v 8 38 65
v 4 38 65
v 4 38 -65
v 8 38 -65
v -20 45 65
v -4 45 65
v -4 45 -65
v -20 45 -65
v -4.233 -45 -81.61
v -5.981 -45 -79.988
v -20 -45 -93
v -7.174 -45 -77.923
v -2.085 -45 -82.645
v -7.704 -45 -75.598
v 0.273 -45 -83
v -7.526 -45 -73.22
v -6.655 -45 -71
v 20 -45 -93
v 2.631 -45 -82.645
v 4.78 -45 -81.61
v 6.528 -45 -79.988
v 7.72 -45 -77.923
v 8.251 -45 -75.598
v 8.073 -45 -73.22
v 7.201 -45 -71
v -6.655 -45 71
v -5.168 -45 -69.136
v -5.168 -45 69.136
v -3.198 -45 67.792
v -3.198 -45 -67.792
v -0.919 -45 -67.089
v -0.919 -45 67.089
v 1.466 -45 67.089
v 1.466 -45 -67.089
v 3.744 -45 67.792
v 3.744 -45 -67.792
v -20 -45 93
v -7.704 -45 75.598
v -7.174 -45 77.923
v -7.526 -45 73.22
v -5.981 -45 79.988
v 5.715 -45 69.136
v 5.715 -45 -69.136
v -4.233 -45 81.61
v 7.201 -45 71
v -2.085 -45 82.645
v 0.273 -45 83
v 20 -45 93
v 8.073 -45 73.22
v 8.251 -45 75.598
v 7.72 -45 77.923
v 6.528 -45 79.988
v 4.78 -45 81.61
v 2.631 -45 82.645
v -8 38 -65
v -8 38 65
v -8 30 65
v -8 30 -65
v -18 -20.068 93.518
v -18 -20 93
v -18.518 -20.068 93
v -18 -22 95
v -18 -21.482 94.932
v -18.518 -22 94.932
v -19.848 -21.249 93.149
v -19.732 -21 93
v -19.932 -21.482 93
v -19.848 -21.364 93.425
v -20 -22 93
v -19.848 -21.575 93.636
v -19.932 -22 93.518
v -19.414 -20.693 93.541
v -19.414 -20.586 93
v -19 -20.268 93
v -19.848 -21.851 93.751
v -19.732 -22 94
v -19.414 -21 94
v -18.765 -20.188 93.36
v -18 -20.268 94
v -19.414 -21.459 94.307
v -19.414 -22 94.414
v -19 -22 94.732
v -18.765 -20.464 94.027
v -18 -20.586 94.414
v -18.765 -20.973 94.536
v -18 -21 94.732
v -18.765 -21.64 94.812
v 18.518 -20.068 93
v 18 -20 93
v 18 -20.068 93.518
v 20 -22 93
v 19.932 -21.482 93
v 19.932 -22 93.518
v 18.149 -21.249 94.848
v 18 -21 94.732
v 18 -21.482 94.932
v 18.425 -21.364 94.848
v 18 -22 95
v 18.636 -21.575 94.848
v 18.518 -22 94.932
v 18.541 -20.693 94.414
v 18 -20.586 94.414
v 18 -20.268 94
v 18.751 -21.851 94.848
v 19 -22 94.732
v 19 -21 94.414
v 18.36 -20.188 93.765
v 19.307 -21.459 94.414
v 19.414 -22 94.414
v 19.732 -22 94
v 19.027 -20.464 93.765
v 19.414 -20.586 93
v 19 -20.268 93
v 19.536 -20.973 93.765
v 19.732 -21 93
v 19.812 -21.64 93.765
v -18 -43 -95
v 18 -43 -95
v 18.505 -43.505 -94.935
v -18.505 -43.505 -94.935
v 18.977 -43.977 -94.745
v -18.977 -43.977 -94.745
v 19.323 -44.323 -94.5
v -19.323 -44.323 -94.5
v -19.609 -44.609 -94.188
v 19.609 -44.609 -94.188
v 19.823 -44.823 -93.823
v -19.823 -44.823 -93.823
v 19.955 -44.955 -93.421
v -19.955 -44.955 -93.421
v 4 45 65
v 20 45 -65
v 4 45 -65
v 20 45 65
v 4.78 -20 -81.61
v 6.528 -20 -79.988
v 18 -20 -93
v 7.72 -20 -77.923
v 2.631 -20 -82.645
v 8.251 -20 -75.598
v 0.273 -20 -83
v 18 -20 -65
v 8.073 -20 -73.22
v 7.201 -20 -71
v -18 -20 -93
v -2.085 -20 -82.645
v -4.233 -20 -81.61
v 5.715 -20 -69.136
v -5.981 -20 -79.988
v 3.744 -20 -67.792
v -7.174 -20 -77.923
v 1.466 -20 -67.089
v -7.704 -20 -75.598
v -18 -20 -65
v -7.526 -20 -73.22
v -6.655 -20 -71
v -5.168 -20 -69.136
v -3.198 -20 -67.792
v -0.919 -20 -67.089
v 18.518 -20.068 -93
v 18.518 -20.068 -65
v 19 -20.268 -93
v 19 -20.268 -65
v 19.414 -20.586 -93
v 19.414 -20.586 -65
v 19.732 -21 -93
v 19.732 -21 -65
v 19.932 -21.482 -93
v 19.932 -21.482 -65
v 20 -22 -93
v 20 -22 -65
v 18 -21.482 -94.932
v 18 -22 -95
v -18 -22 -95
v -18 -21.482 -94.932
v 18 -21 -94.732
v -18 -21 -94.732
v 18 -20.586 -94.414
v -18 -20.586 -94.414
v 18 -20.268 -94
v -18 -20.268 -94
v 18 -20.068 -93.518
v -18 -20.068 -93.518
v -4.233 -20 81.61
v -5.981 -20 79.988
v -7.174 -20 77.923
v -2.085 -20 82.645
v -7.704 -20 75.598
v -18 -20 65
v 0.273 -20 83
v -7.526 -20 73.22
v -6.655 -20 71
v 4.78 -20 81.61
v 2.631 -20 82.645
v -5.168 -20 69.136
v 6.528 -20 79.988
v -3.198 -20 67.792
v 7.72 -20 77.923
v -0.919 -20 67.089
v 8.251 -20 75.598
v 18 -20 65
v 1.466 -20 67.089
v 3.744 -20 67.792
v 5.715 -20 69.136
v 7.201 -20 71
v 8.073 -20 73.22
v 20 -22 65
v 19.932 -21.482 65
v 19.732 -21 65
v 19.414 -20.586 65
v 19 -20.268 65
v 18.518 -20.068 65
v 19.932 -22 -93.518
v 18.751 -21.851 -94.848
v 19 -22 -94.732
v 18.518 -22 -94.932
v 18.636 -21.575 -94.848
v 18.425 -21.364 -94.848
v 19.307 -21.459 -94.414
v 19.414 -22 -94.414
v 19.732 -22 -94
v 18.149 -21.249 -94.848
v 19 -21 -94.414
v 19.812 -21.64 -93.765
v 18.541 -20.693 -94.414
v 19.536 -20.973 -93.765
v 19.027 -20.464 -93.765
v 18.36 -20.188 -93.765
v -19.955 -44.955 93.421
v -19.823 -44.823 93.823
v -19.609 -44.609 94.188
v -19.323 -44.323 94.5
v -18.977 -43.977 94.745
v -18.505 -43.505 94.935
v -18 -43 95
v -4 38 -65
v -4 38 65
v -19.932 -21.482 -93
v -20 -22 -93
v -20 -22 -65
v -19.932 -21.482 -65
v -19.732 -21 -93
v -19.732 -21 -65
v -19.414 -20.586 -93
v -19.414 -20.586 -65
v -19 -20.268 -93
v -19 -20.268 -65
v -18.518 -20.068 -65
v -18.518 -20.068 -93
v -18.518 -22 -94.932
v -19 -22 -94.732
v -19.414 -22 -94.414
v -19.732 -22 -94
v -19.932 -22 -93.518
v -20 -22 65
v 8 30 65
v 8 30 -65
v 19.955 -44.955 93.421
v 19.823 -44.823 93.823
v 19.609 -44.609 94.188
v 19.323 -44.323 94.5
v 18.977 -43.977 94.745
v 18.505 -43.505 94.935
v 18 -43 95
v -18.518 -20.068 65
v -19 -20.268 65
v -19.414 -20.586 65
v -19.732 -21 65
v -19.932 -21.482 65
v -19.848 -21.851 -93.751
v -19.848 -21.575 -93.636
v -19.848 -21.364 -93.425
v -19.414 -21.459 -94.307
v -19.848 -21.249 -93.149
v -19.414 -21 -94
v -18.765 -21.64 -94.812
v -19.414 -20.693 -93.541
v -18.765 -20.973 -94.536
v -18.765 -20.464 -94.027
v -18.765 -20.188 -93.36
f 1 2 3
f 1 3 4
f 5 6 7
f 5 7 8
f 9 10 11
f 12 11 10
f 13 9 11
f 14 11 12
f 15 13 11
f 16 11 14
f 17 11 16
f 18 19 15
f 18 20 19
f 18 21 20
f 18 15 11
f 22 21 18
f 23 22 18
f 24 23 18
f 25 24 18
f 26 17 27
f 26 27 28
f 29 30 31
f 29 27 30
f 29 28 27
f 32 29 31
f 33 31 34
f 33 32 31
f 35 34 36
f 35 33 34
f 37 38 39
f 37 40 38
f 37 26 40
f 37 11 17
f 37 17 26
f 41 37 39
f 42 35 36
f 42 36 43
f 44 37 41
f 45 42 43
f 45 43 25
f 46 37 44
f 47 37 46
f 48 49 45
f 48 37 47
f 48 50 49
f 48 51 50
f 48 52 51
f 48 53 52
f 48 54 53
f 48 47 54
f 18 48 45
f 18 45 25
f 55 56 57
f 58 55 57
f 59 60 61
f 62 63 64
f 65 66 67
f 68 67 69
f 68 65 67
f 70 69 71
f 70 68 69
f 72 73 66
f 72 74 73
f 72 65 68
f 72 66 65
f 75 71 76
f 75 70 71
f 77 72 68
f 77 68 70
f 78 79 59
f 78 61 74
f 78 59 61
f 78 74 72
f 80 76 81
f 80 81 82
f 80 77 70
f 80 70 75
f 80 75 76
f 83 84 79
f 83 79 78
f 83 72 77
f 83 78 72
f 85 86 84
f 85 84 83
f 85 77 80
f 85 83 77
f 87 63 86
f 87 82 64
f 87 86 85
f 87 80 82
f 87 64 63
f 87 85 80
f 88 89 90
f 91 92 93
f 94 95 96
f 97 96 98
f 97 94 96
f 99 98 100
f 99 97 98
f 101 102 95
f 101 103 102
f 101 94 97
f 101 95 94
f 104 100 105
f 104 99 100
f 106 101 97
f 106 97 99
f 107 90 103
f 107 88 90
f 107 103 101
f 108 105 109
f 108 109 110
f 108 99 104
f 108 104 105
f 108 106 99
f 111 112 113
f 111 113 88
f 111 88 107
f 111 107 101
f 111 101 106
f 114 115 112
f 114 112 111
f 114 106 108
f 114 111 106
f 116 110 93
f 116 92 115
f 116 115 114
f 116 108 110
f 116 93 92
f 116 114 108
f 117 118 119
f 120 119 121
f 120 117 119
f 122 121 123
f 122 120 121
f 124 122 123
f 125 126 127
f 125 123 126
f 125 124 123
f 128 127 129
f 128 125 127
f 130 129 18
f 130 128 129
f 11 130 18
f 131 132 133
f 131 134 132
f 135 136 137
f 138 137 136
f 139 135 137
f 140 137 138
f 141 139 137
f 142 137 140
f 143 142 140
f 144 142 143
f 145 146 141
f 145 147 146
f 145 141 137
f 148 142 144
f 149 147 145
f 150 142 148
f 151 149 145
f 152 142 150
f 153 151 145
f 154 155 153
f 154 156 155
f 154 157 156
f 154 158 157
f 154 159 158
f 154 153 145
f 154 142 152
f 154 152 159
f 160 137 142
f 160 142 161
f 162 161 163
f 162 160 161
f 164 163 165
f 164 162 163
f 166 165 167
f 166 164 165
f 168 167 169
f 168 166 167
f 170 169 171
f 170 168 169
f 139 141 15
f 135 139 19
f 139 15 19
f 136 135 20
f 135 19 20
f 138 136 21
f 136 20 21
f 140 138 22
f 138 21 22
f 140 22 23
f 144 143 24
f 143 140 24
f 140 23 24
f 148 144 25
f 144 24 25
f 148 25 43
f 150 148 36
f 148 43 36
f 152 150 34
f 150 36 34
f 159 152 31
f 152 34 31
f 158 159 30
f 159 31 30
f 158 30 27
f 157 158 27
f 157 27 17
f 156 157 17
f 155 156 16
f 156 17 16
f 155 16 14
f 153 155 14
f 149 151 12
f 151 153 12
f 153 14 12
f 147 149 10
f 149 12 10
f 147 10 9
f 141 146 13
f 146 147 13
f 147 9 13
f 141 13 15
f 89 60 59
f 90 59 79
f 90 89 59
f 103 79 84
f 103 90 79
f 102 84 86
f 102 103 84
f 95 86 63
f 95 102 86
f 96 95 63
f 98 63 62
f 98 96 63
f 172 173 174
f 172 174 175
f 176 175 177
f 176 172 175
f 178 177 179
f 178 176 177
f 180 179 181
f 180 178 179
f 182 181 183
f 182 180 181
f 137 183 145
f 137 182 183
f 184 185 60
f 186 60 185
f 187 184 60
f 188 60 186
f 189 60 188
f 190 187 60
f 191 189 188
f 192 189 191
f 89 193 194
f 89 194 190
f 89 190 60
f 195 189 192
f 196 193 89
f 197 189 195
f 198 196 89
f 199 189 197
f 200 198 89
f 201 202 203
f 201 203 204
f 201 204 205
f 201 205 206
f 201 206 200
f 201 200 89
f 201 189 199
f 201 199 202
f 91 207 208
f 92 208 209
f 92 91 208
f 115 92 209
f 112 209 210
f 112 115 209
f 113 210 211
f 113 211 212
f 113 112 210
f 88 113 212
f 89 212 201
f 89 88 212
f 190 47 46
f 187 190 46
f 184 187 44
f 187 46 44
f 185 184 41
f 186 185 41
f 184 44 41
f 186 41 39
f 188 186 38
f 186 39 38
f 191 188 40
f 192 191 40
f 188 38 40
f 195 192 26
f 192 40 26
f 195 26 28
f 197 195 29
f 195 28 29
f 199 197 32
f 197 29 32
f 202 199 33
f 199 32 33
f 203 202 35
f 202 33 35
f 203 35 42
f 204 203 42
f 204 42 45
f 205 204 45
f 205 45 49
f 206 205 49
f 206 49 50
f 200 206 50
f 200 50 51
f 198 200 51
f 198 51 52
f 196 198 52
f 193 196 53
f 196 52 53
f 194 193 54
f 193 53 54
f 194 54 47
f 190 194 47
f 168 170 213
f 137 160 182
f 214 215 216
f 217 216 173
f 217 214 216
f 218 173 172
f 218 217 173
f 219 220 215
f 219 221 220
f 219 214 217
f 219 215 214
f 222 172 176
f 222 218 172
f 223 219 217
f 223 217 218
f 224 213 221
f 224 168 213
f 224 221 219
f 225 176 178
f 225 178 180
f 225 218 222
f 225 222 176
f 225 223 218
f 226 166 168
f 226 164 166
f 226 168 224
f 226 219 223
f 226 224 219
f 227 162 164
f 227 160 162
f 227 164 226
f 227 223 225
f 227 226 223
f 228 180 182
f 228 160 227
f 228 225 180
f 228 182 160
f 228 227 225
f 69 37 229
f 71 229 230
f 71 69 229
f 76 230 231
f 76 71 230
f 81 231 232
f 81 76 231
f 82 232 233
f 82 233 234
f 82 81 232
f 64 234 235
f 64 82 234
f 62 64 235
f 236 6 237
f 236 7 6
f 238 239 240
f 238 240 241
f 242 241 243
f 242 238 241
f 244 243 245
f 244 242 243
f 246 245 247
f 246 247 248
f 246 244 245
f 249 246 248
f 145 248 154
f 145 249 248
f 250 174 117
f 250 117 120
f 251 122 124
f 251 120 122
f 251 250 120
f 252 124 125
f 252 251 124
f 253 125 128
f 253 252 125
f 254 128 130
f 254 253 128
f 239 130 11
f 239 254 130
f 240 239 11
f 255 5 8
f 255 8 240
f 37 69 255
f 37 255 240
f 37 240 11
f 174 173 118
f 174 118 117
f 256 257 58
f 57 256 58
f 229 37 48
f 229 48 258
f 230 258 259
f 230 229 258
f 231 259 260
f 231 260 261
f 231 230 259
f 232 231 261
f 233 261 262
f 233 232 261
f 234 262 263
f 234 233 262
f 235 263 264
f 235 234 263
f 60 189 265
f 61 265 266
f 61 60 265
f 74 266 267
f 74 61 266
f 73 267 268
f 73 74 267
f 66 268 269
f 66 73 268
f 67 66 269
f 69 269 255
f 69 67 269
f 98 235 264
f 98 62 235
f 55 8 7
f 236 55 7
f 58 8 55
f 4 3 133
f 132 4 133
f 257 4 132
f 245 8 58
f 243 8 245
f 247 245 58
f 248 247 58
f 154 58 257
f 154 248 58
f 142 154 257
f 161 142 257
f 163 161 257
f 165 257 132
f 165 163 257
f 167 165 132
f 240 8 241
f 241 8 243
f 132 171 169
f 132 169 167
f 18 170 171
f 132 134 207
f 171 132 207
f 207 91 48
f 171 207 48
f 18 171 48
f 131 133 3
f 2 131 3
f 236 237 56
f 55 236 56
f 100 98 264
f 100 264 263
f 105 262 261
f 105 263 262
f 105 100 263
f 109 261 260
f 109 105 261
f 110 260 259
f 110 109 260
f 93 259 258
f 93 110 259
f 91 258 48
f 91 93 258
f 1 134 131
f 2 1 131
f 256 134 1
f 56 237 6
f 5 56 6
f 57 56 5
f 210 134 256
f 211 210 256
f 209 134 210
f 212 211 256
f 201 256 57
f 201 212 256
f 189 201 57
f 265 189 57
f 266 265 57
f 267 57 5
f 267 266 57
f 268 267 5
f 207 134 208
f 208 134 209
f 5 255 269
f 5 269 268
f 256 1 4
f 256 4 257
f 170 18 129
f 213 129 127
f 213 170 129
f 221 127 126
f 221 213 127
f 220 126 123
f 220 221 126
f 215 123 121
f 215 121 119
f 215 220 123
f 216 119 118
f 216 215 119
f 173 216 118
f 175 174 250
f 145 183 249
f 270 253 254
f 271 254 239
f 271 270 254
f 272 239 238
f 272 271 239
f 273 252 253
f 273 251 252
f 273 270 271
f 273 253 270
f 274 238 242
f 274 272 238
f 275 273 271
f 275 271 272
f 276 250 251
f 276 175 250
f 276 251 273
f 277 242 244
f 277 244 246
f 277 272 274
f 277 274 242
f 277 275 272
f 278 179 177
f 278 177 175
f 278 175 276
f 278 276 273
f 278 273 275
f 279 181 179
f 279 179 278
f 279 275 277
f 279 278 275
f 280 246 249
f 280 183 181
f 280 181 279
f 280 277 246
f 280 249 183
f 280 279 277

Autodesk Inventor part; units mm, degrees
ref_plane "YZ Plane" through (0, 0, 0) normal (1, 0, 0) x (0, 1, 0)
ref_plane "XZ Plane" through (0, 0, 0) normal (0, 1, 0) x (-1, 0, 0)
ref_plane "XY Plane" through (0, 0, 0) normal (0, 0, 1) x (1, 0, 0)
sketch "Esquisse1" plane through (0, 0, 0) normal (0, 1, 0) x (-1, 0, 0)
  line L0 (-20, 65) -> (20, 65)
  line L1 (20, 65) -> (20, -65)
  line L2 (20, -65) -> (-20, -65)
  line L3 (-20, -65) -> (-20, 65)
  line L4 (-20, 65) -> (20, -65) construction
  line L5 (20, 65) -> (-20, -65) construction
  point P0 (0, 0)
  dimension "d0" = 40
  dimension "d1" = 130
extrude "Extrusion1" add sketch "Esquisse1" along normal mid plane 90
sketch "Esquisse2" plane through (20, 45, -65) normal (0, 0, -1) x (-1, 0, 0)
  line L0 (0, 0) -> (40, 0) projected
  line L1 (16, 0) -> (16, -7)
  line L2 (16, -7) -> (12, -7)
  line L3 (12, -7) -> (12, -15)
  line L4 (20, 0.6313) -> (20, -19.069)
  line L5 (12, -15) -> (20, -15)
  line L6 (24, 0) -> (24, -7)
  line L7 (24, -7) -> (28, -7)
  line L8 (28, -7) -> (28, -15)
  line L9 (28, -15) -> (20, -15)
  point P0 (20, -45)
  point P1 (20, 0)
  dimension "d4" = 7
  dimension "d5" = 4
  dimension "d6" = 4
  dimension "d7" = 8
extrude "Extrusion2" cut sketch "Esquisse2" against normal through all
sketch "Esquisse3" plane through (-20, -45, 65) normal (0, 0, 1) x (1, 0, 0)
  line L0 (40, 0) -> (40, 90) projected
  line L1 (0, 25) -> (40, 25)
  line L2 (40, 25) -> (40, 0)
  line L3 (40, 0) -> (0, 0)
  line L4 (0, 0) -> (0, 25)
  line L5 (0, 25) -> (40, 0) construction
  line L6 (40, 25) -> (0, 0) construction
  point P0 (20, 45)
  point P1 (20, 12.5)
  dimension "d10" = 25
extrude "Extrusion3" add sketch "Esquisse3" along normal blind 30
fillet "Congé1" radius 2 6 edges at (20, -20, 80) (20, -32.5, 95) (0, -20, 95) (-20, -20, 80) (-20, -32.5, 95) (0, -45, 95)
sketch "Esquisse4" plane through (-18, -20, 65) normal (0, 1, 0) x (1, 0, 0)
  line L0 (0, -28) -> (0, 0) projected
  line L1 (36, -28) -> (0, -28) projected
  line L2 (36, 0) -> (36, -28) projected
  line L3 (0, 0) -> (36, 0) projected
  line L4 (46, 65) -> (-10, 65) projected
  point P0 (18, 65)
  point P1 (18.2732, -10)
  dimension "d21" = 75
hole "Perçage1" at (0.2732, -20, 75) direction (0, -1, 0) diameter 16 end through all
mirror "Mise en miroir2" about plane through (0, 0, 0) normal (0, 0, 1) of "Extrusion3", "Congé1", "Perçage1"
properties part number "Support"
